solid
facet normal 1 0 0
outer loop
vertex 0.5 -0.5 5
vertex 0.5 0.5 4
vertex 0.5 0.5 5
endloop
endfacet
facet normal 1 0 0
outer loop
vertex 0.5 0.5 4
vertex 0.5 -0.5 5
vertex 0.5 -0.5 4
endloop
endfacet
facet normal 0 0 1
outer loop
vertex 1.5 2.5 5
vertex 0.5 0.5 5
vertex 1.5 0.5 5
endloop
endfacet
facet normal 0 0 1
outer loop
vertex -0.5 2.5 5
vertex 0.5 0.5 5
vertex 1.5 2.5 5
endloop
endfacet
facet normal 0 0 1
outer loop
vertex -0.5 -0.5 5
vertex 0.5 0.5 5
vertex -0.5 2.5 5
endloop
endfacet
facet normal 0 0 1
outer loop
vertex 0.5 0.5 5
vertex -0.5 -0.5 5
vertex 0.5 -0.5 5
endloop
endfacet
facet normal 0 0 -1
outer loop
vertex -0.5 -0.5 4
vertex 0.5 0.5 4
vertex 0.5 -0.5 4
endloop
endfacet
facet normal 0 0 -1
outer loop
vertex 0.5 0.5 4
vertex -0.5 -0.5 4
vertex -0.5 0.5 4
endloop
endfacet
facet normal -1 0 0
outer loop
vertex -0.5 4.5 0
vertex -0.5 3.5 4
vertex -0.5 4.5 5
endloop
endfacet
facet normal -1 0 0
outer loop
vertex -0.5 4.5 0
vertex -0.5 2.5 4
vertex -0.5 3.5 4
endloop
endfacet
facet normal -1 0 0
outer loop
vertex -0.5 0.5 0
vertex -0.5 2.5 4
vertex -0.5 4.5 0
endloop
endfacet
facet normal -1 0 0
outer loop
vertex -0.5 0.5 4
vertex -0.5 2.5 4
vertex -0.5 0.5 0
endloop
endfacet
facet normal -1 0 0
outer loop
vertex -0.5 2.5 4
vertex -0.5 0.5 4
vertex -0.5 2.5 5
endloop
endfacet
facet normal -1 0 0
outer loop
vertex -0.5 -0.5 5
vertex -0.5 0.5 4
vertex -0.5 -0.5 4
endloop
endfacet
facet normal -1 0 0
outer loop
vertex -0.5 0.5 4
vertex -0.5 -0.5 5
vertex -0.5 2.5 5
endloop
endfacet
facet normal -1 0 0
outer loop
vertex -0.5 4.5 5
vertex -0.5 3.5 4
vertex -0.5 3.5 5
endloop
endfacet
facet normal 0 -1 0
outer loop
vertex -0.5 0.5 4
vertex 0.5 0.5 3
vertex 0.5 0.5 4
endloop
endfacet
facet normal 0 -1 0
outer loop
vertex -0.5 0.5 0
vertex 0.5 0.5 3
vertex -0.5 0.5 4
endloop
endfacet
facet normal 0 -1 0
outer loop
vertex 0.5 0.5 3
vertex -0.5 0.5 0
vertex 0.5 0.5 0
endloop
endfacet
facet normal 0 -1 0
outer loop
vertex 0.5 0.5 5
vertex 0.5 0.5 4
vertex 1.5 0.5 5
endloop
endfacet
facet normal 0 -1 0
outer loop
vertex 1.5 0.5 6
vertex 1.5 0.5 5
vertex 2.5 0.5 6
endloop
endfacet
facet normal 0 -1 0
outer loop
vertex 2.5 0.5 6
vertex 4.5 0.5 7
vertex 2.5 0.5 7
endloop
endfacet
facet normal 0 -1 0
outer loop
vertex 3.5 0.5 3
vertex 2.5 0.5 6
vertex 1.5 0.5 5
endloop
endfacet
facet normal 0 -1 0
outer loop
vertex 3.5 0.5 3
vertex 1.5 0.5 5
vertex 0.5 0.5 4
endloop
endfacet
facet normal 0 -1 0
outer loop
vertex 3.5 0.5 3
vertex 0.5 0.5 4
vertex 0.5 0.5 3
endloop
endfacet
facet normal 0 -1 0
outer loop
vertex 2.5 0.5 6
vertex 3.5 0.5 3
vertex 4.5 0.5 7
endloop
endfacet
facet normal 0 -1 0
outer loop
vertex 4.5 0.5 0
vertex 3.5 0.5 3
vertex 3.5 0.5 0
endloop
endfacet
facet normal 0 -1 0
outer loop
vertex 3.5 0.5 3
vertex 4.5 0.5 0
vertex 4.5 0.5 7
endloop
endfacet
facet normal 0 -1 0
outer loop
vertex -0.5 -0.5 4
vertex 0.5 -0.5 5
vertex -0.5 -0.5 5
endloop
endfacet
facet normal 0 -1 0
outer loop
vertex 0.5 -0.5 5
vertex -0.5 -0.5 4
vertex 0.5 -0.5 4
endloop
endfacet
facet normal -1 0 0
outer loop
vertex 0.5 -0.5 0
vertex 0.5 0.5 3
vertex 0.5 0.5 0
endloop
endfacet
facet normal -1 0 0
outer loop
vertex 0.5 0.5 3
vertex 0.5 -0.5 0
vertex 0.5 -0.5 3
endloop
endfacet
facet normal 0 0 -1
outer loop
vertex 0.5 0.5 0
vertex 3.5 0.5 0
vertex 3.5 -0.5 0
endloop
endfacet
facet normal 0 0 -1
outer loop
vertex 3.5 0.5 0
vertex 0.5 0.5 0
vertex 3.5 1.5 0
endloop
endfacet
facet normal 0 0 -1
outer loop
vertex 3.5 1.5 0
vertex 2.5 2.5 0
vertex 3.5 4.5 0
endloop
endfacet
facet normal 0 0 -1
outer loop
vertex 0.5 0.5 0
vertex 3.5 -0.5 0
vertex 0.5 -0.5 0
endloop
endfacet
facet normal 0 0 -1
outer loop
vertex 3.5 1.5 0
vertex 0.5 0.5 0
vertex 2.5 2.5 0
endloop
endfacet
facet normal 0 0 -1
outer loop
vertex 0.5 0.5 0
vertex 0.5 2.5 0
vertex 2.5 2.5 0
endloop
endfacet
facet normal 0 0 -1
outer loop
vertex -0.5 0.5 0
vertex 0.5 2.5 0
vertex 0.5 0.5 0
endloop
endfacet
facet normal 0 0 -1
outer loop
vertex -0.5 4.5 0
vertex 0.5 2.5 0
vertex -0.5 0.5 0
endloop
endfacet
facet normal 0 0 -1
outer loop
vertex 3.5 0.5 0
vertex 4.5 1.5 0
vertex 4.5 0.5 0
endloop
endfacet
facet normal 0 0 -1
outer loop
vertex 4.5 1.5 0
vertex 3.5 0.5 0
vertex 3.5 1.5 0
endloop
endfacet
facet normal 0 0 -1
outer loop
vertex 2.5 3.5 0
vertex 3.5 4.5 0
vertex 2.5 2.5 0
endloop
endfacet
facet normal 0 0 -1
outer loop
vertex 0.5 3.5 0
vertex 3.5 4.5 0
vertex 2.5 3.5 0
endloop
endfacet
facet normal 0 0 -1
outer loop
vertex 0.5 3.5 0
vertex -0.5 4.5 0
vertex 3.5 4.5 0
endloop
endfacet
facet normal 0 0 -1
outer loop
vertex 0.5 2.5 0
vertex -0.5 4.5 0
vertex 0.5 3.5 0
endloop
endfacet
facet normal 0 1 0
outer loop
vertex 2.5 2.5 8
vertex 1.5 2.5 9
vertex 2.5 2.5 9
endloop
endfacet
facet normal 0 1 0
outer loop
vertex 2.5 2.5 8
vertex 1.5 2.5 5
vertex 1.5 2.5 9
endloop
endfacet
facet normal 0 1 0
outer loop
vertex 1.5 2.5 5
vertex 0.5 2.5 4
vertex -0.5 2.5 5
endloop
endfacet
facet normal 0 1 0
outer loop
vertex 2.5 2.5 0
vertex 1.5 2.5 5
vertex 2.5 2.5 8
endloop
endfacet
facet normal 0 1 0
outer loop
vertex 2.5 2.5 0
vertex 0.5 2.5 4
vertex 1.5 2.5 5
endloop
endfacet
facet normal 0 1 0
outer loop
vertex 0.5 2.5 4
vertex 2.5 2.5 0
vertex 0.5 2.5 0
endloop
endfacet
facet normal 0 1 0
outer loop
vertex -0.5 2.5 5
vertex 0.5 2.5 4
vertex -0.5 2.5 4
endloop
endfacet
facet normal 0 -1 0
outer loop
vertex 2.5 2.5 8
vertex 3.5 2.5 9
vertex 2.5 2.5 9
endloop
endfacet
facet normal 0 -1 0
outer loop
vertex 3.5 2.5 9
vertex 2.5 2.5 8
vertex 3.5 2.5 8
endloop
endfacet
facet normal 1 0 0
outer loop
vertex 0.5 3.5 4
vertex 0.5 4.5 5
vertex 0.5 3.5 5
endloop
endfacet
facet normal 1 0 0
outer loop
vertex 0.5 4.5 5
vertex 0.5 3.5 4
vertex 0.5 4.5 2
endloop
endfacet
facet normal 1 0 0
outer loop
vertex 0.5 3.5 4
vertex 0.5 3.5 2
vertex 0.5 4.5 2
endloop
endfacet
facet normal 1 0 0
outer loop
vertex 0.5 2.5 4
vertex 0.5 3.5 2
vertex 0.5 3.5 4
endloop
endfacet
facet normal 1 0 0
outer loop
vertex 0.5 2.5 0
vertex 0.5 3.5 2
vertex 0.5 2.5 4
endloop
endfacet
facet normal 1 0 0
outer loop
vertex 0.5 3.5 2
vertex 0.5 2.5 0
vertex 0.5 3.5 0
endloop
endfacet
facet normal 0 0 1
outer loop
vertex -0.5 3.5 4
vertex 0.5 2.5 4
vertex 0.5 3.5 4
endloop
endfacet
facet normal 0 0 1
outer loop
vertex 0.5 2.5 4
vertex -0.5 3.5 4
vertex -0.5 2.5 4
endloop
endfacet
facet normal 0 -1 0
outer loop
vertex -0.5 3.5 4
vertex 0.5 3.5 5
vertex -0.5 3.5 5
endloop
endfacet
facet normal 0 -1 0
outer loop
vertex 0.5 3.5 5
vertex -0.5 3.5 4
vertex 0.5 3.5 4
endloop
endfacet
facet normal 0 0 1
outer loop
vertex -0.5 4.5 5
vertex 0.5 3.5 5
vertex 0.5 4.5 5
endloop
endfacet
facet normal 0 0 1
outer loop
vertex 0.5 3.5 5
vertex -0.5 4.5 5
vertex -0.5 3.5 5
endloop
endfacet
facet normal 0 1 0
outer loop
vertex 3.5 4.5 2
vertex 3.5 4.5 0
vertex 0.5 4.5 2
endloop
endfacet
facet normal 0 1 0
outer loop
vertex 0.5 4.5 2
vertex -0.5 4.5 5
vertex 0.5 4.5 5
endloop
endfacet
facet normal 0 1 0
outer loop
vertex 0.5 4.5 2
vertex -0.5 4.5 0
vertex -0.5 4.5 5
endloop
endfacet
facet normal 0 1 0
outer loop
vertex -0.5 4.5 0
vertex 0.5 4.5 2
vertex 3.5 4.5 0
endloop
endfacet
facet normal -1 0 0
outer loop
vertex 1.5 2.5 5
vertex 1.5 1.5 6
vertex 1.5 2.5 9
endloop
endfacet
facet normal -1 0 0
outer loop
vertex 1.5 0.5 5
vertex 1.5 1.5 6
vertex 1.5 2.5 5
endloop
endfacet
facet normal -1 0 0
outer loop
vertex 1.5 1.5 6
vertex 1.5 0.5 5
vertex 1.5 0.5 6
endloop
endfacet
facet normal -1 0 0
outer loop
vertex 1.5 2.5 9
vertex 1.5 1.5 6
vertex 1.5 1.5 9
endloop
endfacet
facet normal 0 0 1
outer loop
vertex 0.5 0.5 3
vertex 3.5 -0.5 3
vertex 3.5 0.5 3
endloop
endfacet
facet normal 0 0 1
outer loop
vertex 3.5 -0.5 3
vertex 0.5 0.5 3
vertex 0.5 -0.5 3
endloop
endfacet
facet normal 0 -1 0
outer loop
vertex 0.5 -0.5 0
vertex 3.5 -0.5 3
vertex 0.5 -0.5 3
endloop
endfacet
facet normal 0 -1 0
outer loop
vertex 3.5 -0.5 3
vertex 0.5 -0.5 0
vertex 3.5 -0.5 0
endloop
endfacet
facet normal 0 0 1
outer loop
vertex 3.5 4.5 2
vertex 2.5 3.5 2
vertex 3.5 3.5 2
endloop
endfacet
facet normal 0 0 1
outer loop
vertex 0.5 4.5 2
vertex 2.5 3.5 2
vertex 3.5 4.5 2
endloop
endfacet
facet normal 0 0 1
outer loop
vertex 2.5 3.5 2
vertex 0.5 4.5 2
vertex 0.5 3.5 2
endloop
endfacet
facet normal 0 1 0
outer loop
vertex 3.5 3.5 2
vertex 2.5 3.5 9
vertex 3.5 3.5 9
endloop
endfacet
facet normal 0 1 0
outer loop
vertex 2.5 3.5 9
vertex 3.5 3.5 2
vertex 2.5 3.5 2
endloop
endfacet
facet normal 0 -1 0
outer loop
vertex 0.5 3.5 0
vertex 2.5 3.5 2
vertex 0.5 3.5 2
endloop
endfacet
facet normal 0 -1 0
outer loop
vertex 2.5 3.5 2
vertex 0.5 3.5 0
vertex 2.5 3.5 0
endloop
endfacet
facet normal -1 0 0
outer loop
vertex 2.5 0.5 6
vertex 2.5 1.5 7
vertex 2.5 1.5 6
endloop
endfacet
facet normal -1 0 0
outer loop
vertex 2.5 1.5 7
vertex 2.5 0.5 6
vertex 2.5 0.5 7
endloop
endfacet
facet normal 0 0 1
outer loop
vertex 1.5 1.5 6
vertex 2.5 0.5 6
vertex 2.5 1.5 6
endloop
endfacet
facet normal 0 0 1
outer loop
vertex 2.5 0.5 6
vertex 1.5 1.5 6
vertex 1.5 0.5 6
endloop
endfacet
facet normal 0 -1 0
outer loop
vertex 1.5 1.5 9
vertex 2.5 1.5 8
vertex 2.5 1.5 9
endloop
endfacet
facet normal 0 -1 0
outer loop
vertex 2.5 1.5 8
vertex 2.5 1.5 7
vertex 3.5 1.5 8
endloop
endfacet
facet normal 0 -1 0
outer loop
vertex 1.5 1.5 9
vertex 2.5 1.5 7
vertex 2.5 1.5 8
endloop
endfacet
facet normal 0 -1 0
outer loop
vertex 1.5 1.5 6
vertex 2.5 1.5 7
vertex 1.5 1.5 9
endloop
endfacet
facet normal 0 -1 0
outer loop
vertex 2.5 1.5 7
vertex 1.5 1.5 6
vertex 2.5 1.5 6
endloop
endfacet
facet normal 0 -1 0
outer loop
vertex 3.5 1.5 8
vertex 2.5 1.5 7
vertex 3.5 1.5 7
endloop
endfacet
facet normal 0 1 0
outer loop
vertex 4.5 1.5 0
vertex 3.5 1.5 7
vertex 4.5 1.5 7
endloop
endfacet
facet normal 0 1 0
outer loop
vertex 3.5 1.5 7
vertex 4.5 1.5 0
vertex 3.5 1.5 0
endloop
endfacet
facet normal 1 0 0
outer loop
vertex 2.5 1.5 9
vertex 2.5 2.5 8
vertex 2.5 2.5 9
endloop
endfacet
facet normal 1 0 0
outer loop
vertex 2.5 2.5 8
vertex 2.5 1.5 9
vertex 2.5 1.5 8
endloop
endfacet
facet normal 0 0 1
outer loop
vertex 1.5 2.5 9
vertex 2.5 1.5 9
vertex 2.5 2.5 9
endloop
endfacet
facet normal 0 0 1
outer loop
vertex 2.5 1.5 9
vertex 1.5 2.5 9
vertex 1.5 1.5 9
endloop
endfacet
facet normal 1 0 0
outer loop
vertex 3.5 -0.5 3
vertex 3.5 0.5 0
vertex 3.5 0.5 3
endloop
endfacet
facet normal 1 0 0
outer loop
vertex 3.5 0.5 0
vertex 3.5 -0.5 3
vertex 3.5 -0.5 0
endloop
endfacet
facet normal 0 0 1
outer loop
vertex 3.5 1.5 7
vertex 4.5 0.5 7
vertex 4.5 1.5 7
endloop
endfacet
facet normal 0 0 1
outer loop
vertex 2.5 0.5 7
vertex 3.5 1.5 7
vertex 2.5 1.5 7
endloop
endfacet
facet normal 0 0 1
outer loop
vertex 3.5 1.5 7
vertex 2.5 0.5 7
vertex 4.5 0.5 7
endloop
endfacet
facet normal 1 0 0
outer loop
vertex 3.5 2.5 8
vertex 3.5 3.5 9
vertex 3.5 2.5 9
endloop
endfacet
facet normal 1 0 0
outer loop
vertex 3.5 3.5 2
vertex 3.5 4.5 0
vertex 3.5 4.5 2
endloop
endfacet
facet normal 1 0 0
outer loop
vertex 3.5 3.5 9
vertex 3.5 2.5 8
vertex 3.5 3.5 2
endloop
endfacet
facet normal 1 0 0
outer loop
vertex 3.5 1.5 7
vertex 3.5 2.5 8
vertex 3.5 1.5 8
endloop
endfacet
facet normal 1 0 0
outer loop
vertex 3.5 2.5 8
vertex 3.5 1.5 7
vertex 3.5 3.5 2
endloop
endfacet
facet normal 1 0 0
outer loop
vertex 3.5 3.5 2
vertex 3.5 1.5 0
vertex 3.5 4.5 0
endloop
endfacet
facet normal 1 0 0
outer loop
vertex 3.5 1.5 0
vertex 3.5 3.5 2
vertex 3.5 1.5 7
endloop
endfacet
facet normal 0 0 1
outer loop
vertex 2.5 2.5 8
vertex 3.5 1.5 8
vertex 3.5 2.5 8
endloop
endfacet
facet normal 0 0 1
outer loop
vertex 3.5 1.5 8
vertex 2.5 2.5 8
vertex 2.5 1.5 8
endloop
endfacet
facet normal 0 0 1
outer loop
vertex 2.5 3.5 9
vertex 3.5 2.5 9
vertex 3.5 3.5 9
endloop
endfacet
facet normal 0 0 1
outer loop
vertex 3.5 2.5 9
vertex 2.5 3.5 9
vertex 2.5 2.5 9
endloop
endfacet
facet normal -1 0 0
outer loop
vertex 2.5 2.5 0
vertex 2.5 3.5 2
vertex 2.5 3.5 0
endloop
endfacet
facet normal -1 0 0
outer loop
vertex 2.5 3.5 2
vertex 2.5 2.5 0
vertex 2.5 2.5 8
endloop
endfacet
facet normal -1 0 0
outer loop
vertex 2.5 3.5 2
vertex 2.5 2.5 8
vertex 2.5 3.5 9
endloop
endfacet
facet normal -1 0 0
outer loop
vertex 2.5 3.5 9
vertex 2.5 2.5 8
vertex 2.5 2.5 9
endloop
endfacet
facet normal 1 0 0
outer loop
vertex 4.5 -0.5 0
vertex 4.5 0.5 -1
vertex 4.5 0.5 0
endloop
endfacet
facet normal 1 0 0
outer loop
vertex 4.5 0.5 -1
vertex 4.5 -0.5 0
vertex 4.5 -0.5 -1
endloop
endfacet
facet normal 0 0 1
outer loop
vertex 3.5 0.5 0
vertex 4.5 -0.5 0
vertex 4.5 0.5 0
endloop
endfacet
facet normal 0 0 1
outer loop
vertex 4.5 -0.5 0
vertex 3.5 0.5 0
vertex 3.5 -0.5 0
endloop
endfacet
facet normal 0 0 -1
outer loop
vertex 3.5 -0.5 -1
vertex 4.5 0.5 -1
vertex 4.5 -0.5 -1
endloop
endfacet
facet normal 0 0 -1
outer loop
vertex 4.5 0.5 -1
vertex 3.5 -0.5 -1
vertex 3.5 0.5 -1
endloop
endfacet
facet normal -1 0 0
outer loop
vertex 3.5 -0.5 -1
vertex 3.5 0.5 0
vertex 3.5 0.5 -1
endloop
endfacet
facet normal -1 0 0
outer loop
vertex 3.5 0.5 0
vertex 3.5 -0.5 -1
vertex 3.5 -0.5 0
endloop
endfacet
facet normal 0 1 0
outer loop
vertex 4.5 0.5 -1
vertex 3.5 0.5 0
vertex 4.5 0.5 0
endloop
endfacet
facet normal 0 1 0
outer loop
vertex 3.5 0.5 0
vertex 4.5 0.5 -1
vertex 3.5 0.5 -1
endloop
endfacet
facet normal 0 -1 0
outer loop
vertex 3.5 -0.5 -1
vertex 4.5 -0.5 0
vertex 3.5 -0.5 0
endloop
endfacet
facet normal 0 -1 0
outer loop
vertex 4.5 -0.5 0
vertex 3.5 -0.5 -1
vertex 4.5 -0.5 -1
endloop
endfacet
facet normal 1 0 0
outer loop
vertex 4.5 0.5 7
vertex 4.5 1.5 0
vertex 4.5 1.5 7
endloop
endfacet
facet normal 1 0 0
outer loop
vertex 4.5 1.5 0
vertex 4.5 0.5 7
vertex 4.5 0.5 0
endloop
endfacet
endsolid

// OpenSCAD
union() {
    translate([0, 0, 4.5]) color([1, 0, 0]) cube([1, 1, 1], center=true);
    translate([0, 1, 2.5]) cube([1, 1, 5], center=true);
    translate([0, 2, 2.5]) cube([1, 1, 5], center=true);
    translate([0, 3, 2.0]) cube([1, 1, 4], center=true);
    translate([0, 4, 2.5]) cube([1, 1, 5], center=true);
    translate([1, 0, 1.5]) cube([1, 1, 3], center=true);
    translate([1, 1, 2.5]) cube([1, 1, 5], center=true);
    translate([1, 2, 2.5]) cube([1, 1, 5], center=true);
    translate([1, 4, 1.0]) cube([1, 1, 2], center=true);
    translate([2, 0, 1.5]) cube([1, 1, 3], center=true);
    translate([2, 1, 3.0]) cube([1, 1, 6], center=true);
    translate([2, 2, 4.5]) cube([1, 1, 9], center=true);
    translate([2, 4, 1.0]) cube([1, 1, 2], center=true);
    translate([3, 0, 1.5]) cube([1, 1, 3], center=true);
    translate([3, 1, 3.5]) cube([1, 1, 7], center=true);
    translate([3, 2, 4.0]) cube([1, 1, 8], center=true);
    translate([3, 3, 4.5]) cube([1, 1, 9], center=true);
    translate([3, 4, 1.0]) cube([1, 1, 2], center=true);
    translate([4, 0, -0.5]) color([0, 0, 1]) cube([1, 1, 1], center=true);
    translate([4, 1, 3.5]) cube([1, 1, 7], center=true);
}
